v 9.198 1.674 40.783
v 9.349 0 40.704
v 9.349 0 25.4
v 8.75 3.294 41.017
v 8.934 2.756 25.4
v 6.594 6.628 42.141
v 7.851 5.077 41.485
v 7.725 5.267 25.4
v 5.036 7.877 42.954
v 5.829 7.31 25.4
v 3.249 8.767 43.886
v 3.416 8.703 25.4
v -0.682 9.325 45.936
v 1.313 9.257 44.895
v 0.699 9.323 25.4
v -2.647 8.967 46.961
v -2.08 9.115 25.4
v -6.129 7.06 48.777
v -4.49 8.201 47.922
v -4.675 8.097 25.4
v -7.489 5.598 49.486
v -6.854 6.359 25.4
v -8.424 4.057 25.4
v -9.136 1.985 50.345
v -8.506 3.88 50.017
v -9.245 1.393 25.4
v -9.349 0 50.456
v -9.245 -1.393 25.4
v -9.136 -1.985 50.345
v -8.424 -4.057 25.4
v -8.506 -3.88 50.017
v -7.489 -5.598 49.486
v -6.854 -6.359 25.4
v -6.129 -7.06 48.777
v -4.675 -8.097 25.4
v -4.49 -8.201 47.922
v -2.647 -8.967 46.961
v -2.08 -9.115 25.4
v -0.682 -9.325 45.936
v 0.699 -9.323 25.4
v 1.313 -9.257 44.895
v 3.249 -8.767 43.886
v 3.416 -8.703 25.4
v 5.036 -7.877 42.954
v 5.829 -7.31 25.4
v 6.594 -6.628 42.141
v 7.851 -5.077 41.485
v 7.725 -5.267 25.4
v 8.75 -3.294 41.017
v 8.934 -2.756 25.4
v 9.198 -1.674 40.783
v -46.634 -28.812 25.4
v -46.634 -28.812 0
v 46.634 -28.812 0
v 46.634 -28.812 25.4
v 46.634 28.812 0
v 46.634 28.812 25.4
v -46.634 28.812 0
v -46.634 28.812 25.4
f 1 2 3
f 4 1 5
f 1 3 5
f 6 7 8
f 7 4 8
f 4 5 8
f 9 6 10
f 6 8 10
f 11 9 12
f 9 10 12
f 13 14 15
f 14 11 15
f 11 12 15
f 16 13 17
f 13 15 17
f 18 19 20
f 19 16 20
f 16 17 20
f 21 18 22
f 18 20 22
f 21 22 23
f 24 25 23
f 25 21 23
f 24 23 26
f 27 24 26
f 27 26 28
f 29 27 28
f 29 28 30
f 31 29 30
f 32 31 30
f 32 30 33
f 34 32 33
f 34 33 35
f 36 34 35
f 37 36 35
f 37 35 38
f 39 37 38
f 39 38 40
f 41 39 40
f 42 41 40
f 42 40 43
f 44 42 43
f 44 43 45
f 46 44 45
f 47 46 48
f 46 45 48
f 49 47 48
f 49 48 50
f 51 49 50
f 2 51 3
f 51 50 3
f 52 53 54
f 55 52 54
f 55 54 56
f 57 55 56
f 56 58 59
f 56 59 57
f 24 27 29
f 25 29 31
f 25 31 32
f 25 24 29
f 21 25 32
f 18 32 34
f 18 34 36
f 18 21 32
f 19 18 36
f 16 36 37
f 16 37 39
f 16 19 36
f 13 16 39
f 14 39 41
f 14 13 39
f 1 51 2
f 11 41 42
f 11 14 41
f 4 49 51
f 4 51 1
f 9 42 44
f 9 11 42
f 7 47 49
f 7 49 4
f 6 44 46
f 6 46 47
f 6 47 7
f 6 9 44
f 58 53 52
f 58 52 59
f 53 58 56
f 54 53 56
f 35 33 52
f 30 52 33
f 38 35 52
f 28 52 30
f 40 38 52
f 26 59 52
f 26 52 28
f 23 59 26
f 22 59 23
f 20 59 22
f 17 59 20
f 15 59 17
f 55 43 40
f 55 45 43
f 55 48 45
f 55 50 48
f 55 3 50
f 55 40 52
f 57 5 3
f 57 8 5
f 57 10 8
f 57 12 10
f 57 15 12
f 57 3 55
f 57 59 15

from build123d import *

# Parameters (mm, degrees)
F0_R     = 9.349466
F1_DEPTH = 50.8
F0_W     = 93.26841
F0_H     = 57.62465
F2_DEPTH = 25.4
F4_DEPTH = 25.4
F5_DEPTH = 76.2


with BuildPart() as f1:
    # F0 (on Top) → F1 (new body)
    with BuildSketch(Plane.XY):
        Circle(F0_R)
    extrude(amount=F1_DEPTH)

    # F0 (on Top) → F2 (join)
    with BuildSketch(Plane.XY):
        Rectangle(F0_W, F0_H)
        Circle(F0_R, mode=Mode.SUBTRACT)
    extrude(amount=F2_DEPTH)

    # F3 (on Front) → F4 (cut)
    with BuildSketch(Plane.XZ):
        Polygon((29.052887, 52.606806), (-13.472474, 52.606806), (29.052887, 30.427627), align=None)
    extrude(amount=-F4_DEPTH, mode=Mode.SUBTRACT)

    # F3 (on Front) → F5 (cut)
    with BuildSketch(Plane.XZ):
        Polygon((29.052887, 52.606806), (-13.472474, 52.606806), (29.052887, 30.427627), align=None)
    extrude(amount=F5_DEPTH, mode=Mode.SUBTRACT)


solid = f1.part
